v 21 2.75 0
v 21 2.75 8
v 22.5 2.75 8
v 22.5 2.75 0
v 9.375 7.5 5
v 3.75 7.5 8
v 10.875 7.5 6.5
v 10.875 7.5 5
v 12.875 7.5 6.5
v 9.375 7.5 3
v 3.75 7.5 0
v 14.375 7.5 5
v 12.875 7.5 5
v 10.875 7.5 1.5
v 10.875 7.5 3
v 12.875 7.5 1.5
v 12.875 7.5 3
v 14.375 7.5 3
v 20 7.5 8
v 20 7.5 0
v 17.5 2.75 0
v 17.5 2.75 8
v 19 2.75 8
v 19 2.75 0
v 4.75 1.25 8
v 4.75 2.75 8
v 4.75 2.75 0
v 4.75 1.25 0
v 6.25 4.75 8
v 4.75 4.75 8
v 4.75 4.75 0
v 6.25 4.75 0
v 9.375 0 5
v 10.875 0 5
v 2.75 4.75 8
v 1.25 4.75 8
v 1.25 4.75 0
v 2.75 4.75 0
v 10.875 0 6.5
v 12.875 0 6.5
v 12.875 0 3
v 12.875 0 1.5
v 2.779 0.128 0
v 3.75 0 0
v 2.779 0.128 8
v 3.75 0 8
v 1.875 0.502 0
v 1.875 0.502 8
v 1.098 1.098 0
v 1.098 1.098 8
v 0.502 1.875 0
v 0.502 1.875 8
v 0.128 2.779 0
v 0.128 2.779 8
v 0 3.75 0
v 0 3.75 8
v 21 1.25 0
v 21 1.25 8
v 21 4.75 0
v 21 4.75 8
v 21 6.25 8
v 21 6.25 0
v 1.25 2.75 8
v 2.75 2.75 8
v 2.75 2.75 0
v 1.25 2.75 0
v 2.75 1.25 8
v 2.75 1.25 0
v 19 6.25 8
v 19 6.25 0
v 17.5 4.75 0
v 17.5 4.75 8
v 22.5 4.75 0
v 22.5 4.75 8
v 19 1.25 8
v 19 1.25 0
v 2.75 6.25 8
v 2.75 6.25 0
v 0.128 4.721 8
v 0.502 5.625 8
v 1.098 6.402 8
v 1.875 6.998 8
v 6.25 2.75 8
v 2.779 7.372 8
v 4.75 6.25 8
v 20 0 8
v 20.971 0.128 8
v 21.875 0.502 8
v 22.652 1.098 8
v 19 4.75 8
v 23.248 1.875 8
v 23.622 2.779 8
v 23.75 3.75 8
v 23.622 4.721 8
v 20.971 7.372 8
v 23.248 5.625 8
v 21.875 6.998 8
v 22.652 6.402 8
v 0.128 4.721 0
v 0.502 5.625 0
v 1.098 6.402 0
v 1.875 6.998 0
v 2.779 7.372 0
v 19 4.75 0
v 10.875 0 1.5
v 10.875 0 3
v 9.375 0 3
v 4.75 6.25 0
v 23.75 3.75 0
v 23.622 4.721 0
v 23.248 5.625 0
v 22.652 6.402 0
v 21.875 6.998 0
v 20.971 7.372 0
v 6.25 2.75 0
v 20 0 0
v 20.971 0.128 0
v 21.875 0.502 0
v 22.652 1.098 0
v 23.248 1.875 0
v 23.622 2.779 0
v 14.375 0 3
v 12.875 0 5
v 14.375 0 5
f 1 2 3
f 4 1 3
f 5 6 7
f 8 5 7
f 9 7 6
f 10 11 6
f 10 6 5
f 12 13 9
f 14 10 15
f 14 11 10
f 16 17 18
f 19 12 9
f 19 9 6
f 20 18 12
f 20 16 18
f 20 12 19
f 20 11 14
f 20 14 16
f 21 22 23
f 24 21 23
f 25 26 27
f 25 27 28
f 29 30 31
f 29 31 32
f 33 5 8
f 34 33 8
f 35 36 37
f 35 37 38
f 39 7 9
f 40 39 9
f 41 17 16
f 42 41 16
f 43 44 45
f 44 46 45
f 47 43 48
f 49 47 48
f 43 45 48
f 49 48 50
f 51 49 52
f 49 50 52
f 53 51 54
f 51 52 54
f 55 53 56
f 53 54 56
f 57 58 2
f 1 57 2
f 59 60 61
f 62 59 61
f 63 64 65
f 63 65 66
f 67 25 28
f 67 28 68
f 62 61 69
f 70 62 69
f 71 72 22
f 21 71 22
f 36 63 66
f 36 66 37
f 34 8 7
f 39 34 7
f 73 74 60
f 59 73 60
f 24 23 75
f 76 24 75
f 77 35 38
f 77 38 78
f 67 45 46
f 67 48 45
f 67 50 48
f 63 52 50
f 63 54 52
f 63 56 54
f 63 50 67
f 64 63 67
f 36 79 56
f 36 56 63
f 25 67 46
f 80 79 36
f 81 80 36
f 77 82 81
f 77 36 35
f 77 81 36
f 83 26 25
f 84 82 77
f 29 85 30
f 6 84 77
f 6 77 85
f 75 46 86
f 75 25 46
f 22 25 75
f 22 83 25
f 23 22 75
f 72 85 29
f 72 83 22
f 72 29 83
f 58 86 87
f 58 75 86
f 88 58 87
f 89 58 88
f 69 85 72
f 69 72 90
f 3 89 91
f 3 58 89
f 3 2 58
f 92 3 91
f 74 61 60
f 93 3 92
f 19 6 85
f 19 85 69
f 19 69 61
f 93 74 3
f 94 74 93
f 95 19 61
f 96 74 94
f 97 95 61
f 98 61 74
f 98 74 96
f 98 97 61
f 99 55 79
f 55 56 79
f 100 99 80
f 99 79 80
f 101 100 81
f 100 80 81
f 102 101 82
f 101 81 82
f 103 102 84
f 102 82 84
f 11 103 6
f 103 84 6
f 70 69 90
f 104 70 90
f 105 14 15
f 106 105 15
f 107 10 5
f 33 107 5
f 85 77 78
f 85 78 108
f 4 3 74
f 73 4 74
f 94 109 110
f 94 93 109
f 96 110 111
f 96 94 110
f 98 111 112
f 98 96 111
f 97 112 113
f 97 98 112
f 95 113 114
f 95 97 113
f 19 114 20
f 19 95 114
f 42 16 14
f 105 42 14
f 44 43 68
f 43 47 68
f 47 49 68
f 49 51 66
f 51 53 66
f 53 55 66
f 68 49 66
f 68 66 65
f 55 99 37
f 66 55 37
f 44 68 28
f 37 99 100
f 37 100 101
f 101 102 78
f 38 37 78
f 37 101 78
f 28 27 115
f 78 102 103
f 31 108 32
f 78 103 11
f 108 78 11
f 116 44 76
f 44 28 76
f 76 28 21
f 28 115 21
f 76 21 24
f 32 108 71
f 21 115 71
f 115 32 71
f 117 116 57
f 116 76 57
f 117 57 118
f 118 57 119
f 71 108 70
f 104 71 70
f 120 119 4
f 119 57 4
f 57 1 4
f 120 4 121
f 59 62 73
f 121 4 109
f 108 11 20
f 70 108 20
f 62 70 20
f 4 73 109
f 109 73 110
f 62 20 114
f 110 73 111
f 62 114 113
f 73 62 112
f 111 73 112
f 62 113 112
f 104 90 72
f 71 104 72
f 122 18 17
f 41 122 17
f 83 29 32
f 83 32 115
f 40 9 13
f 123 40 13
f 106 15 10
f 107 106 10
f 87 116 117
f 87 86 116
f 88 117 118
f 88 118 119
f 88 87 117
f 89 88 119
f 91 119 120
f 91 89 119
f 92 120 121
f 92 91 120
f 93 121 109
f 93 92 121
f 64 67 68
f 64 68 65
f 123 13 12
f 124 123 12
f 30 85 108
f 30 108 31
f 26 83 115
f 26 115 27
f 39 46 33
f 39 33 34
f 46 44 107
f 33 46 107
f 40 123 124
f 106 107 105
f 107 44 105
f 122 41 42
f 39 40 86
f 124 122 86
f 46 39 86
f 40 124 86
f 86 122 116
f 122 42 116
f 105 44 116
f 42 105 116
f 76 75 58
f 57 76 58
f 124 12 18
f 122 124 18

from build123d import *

# Parameters (mm, degrees)
SKETCH1_W           = 23.75
SKETCH1_H           = 7.5
BOSS_EXTRUDE1_DEPTH = 8
FILLET1_R           = 3.75
FILLET2_R           = 3.75
CUT_EXTRUDE13_DEPTH = 27.159367347
CUT_EXTRUDE14_DEPTH = 10


with BuildPart() as part:
    # Sketch1 → Boss-Extrude1 (new body)
    with BuildSketch(Plane.XY):
        with Locations((11.875, 3.75)):
            Rectangle(SKETCH1_W, SKETCH1_H)
    extrude(amount=BOSS_EXTRUDE1_DEPTH)

    # Fillet1
    fillet1_edges = [part.edges().sort_by_distance(p)[0] for p in [
        (23.75, 0, 4),
        (23.75, 7.5, 4),
    ]]
    fillet(fillet1_edges, radius=FILLET1_R - 0.0001)  # a hair under: the kernel refuses the full size

    # Fillet2
    fillet2_edges = [part.edges().sort_by_distance(p)[0] for p in [
        (0, 0, 4),
        (0, 7.5, 4),
    ]]
    fillet(fillet2_edges, radius=FILLET2_R - 0.0001)  # a hair under: the kernel refuses the full size

    # Sketch17 → Cut-Extrude13 (cut, through all)
    with BuildSketch(Plane.XY.offset(8)):
        Polygon((21, 6.25), (20, 6.25), (20, 3.75), (22.5, 3.75), (22.5, 4.75), (21, 4.75), align=None)
        Polygon((20, 3.75), (20, 6.25), (19, 6.25), (19, 4.75), (17.5, 4.75), (17.5, 2.75), (19, 2.75), (19, 1.25), (20, 1.25), align=None)
        Polygon((22.5, 3.75), (20, 3.75), (20, 1.25), (21, 1.25), (21, 2.75), (22.5, 2.75), align=None)
    cut_extrude13 = extrude(amount=-CUT_EXTRUDE13_DEPTH, mode=Mode.SUBTRACT)

    # Mirror4: Cut-Extrude13 across plane
    add(cut_extrude13.mirror(Plane(origin=(11.875, 0, 0), x_dir=(0, 0, 1), z_dir=(1, 0, 0))), mode=Mode.SUBTRACT)

    # Sketch18 → Cut-Extrude14 (cut)
    with BuildSketch(Plane(origin=(0, 7.5, 0), x_dir=(1, 0, 0), z_dir=(0, 1, 0))):
        Polygon((14.375, -4), (11.875, -4), (11.875, -6.5), (12.875, -6.5), (12.875, -5), (14.375, -5), align=None)
        Polygon((11.875, -4), (13.90625, -3), (12.875, -3), (12.875, -1.5), (11.875, -1.5), align=None)
        Polygon((14.375, -3), (13.90625, -3), (11.875, -4), (14.375, -4), align=None)
        Polygon((9.84375, -5), (11.875, -4), (11.875, -1.5), (10.875, -1.5), (10.875, -3), (9.375, -3), (9.375, -5), align=None)
        Polygon((11.875, -6.5), (11.875, -4), (9.84375, -5), (10.875, -5), (10.875, -6.5), align=None)
    extrude(amount=-CUT_EXTRUDE14_DEPTH, mode=Mode.SUBTRACT)


solid = part.part
